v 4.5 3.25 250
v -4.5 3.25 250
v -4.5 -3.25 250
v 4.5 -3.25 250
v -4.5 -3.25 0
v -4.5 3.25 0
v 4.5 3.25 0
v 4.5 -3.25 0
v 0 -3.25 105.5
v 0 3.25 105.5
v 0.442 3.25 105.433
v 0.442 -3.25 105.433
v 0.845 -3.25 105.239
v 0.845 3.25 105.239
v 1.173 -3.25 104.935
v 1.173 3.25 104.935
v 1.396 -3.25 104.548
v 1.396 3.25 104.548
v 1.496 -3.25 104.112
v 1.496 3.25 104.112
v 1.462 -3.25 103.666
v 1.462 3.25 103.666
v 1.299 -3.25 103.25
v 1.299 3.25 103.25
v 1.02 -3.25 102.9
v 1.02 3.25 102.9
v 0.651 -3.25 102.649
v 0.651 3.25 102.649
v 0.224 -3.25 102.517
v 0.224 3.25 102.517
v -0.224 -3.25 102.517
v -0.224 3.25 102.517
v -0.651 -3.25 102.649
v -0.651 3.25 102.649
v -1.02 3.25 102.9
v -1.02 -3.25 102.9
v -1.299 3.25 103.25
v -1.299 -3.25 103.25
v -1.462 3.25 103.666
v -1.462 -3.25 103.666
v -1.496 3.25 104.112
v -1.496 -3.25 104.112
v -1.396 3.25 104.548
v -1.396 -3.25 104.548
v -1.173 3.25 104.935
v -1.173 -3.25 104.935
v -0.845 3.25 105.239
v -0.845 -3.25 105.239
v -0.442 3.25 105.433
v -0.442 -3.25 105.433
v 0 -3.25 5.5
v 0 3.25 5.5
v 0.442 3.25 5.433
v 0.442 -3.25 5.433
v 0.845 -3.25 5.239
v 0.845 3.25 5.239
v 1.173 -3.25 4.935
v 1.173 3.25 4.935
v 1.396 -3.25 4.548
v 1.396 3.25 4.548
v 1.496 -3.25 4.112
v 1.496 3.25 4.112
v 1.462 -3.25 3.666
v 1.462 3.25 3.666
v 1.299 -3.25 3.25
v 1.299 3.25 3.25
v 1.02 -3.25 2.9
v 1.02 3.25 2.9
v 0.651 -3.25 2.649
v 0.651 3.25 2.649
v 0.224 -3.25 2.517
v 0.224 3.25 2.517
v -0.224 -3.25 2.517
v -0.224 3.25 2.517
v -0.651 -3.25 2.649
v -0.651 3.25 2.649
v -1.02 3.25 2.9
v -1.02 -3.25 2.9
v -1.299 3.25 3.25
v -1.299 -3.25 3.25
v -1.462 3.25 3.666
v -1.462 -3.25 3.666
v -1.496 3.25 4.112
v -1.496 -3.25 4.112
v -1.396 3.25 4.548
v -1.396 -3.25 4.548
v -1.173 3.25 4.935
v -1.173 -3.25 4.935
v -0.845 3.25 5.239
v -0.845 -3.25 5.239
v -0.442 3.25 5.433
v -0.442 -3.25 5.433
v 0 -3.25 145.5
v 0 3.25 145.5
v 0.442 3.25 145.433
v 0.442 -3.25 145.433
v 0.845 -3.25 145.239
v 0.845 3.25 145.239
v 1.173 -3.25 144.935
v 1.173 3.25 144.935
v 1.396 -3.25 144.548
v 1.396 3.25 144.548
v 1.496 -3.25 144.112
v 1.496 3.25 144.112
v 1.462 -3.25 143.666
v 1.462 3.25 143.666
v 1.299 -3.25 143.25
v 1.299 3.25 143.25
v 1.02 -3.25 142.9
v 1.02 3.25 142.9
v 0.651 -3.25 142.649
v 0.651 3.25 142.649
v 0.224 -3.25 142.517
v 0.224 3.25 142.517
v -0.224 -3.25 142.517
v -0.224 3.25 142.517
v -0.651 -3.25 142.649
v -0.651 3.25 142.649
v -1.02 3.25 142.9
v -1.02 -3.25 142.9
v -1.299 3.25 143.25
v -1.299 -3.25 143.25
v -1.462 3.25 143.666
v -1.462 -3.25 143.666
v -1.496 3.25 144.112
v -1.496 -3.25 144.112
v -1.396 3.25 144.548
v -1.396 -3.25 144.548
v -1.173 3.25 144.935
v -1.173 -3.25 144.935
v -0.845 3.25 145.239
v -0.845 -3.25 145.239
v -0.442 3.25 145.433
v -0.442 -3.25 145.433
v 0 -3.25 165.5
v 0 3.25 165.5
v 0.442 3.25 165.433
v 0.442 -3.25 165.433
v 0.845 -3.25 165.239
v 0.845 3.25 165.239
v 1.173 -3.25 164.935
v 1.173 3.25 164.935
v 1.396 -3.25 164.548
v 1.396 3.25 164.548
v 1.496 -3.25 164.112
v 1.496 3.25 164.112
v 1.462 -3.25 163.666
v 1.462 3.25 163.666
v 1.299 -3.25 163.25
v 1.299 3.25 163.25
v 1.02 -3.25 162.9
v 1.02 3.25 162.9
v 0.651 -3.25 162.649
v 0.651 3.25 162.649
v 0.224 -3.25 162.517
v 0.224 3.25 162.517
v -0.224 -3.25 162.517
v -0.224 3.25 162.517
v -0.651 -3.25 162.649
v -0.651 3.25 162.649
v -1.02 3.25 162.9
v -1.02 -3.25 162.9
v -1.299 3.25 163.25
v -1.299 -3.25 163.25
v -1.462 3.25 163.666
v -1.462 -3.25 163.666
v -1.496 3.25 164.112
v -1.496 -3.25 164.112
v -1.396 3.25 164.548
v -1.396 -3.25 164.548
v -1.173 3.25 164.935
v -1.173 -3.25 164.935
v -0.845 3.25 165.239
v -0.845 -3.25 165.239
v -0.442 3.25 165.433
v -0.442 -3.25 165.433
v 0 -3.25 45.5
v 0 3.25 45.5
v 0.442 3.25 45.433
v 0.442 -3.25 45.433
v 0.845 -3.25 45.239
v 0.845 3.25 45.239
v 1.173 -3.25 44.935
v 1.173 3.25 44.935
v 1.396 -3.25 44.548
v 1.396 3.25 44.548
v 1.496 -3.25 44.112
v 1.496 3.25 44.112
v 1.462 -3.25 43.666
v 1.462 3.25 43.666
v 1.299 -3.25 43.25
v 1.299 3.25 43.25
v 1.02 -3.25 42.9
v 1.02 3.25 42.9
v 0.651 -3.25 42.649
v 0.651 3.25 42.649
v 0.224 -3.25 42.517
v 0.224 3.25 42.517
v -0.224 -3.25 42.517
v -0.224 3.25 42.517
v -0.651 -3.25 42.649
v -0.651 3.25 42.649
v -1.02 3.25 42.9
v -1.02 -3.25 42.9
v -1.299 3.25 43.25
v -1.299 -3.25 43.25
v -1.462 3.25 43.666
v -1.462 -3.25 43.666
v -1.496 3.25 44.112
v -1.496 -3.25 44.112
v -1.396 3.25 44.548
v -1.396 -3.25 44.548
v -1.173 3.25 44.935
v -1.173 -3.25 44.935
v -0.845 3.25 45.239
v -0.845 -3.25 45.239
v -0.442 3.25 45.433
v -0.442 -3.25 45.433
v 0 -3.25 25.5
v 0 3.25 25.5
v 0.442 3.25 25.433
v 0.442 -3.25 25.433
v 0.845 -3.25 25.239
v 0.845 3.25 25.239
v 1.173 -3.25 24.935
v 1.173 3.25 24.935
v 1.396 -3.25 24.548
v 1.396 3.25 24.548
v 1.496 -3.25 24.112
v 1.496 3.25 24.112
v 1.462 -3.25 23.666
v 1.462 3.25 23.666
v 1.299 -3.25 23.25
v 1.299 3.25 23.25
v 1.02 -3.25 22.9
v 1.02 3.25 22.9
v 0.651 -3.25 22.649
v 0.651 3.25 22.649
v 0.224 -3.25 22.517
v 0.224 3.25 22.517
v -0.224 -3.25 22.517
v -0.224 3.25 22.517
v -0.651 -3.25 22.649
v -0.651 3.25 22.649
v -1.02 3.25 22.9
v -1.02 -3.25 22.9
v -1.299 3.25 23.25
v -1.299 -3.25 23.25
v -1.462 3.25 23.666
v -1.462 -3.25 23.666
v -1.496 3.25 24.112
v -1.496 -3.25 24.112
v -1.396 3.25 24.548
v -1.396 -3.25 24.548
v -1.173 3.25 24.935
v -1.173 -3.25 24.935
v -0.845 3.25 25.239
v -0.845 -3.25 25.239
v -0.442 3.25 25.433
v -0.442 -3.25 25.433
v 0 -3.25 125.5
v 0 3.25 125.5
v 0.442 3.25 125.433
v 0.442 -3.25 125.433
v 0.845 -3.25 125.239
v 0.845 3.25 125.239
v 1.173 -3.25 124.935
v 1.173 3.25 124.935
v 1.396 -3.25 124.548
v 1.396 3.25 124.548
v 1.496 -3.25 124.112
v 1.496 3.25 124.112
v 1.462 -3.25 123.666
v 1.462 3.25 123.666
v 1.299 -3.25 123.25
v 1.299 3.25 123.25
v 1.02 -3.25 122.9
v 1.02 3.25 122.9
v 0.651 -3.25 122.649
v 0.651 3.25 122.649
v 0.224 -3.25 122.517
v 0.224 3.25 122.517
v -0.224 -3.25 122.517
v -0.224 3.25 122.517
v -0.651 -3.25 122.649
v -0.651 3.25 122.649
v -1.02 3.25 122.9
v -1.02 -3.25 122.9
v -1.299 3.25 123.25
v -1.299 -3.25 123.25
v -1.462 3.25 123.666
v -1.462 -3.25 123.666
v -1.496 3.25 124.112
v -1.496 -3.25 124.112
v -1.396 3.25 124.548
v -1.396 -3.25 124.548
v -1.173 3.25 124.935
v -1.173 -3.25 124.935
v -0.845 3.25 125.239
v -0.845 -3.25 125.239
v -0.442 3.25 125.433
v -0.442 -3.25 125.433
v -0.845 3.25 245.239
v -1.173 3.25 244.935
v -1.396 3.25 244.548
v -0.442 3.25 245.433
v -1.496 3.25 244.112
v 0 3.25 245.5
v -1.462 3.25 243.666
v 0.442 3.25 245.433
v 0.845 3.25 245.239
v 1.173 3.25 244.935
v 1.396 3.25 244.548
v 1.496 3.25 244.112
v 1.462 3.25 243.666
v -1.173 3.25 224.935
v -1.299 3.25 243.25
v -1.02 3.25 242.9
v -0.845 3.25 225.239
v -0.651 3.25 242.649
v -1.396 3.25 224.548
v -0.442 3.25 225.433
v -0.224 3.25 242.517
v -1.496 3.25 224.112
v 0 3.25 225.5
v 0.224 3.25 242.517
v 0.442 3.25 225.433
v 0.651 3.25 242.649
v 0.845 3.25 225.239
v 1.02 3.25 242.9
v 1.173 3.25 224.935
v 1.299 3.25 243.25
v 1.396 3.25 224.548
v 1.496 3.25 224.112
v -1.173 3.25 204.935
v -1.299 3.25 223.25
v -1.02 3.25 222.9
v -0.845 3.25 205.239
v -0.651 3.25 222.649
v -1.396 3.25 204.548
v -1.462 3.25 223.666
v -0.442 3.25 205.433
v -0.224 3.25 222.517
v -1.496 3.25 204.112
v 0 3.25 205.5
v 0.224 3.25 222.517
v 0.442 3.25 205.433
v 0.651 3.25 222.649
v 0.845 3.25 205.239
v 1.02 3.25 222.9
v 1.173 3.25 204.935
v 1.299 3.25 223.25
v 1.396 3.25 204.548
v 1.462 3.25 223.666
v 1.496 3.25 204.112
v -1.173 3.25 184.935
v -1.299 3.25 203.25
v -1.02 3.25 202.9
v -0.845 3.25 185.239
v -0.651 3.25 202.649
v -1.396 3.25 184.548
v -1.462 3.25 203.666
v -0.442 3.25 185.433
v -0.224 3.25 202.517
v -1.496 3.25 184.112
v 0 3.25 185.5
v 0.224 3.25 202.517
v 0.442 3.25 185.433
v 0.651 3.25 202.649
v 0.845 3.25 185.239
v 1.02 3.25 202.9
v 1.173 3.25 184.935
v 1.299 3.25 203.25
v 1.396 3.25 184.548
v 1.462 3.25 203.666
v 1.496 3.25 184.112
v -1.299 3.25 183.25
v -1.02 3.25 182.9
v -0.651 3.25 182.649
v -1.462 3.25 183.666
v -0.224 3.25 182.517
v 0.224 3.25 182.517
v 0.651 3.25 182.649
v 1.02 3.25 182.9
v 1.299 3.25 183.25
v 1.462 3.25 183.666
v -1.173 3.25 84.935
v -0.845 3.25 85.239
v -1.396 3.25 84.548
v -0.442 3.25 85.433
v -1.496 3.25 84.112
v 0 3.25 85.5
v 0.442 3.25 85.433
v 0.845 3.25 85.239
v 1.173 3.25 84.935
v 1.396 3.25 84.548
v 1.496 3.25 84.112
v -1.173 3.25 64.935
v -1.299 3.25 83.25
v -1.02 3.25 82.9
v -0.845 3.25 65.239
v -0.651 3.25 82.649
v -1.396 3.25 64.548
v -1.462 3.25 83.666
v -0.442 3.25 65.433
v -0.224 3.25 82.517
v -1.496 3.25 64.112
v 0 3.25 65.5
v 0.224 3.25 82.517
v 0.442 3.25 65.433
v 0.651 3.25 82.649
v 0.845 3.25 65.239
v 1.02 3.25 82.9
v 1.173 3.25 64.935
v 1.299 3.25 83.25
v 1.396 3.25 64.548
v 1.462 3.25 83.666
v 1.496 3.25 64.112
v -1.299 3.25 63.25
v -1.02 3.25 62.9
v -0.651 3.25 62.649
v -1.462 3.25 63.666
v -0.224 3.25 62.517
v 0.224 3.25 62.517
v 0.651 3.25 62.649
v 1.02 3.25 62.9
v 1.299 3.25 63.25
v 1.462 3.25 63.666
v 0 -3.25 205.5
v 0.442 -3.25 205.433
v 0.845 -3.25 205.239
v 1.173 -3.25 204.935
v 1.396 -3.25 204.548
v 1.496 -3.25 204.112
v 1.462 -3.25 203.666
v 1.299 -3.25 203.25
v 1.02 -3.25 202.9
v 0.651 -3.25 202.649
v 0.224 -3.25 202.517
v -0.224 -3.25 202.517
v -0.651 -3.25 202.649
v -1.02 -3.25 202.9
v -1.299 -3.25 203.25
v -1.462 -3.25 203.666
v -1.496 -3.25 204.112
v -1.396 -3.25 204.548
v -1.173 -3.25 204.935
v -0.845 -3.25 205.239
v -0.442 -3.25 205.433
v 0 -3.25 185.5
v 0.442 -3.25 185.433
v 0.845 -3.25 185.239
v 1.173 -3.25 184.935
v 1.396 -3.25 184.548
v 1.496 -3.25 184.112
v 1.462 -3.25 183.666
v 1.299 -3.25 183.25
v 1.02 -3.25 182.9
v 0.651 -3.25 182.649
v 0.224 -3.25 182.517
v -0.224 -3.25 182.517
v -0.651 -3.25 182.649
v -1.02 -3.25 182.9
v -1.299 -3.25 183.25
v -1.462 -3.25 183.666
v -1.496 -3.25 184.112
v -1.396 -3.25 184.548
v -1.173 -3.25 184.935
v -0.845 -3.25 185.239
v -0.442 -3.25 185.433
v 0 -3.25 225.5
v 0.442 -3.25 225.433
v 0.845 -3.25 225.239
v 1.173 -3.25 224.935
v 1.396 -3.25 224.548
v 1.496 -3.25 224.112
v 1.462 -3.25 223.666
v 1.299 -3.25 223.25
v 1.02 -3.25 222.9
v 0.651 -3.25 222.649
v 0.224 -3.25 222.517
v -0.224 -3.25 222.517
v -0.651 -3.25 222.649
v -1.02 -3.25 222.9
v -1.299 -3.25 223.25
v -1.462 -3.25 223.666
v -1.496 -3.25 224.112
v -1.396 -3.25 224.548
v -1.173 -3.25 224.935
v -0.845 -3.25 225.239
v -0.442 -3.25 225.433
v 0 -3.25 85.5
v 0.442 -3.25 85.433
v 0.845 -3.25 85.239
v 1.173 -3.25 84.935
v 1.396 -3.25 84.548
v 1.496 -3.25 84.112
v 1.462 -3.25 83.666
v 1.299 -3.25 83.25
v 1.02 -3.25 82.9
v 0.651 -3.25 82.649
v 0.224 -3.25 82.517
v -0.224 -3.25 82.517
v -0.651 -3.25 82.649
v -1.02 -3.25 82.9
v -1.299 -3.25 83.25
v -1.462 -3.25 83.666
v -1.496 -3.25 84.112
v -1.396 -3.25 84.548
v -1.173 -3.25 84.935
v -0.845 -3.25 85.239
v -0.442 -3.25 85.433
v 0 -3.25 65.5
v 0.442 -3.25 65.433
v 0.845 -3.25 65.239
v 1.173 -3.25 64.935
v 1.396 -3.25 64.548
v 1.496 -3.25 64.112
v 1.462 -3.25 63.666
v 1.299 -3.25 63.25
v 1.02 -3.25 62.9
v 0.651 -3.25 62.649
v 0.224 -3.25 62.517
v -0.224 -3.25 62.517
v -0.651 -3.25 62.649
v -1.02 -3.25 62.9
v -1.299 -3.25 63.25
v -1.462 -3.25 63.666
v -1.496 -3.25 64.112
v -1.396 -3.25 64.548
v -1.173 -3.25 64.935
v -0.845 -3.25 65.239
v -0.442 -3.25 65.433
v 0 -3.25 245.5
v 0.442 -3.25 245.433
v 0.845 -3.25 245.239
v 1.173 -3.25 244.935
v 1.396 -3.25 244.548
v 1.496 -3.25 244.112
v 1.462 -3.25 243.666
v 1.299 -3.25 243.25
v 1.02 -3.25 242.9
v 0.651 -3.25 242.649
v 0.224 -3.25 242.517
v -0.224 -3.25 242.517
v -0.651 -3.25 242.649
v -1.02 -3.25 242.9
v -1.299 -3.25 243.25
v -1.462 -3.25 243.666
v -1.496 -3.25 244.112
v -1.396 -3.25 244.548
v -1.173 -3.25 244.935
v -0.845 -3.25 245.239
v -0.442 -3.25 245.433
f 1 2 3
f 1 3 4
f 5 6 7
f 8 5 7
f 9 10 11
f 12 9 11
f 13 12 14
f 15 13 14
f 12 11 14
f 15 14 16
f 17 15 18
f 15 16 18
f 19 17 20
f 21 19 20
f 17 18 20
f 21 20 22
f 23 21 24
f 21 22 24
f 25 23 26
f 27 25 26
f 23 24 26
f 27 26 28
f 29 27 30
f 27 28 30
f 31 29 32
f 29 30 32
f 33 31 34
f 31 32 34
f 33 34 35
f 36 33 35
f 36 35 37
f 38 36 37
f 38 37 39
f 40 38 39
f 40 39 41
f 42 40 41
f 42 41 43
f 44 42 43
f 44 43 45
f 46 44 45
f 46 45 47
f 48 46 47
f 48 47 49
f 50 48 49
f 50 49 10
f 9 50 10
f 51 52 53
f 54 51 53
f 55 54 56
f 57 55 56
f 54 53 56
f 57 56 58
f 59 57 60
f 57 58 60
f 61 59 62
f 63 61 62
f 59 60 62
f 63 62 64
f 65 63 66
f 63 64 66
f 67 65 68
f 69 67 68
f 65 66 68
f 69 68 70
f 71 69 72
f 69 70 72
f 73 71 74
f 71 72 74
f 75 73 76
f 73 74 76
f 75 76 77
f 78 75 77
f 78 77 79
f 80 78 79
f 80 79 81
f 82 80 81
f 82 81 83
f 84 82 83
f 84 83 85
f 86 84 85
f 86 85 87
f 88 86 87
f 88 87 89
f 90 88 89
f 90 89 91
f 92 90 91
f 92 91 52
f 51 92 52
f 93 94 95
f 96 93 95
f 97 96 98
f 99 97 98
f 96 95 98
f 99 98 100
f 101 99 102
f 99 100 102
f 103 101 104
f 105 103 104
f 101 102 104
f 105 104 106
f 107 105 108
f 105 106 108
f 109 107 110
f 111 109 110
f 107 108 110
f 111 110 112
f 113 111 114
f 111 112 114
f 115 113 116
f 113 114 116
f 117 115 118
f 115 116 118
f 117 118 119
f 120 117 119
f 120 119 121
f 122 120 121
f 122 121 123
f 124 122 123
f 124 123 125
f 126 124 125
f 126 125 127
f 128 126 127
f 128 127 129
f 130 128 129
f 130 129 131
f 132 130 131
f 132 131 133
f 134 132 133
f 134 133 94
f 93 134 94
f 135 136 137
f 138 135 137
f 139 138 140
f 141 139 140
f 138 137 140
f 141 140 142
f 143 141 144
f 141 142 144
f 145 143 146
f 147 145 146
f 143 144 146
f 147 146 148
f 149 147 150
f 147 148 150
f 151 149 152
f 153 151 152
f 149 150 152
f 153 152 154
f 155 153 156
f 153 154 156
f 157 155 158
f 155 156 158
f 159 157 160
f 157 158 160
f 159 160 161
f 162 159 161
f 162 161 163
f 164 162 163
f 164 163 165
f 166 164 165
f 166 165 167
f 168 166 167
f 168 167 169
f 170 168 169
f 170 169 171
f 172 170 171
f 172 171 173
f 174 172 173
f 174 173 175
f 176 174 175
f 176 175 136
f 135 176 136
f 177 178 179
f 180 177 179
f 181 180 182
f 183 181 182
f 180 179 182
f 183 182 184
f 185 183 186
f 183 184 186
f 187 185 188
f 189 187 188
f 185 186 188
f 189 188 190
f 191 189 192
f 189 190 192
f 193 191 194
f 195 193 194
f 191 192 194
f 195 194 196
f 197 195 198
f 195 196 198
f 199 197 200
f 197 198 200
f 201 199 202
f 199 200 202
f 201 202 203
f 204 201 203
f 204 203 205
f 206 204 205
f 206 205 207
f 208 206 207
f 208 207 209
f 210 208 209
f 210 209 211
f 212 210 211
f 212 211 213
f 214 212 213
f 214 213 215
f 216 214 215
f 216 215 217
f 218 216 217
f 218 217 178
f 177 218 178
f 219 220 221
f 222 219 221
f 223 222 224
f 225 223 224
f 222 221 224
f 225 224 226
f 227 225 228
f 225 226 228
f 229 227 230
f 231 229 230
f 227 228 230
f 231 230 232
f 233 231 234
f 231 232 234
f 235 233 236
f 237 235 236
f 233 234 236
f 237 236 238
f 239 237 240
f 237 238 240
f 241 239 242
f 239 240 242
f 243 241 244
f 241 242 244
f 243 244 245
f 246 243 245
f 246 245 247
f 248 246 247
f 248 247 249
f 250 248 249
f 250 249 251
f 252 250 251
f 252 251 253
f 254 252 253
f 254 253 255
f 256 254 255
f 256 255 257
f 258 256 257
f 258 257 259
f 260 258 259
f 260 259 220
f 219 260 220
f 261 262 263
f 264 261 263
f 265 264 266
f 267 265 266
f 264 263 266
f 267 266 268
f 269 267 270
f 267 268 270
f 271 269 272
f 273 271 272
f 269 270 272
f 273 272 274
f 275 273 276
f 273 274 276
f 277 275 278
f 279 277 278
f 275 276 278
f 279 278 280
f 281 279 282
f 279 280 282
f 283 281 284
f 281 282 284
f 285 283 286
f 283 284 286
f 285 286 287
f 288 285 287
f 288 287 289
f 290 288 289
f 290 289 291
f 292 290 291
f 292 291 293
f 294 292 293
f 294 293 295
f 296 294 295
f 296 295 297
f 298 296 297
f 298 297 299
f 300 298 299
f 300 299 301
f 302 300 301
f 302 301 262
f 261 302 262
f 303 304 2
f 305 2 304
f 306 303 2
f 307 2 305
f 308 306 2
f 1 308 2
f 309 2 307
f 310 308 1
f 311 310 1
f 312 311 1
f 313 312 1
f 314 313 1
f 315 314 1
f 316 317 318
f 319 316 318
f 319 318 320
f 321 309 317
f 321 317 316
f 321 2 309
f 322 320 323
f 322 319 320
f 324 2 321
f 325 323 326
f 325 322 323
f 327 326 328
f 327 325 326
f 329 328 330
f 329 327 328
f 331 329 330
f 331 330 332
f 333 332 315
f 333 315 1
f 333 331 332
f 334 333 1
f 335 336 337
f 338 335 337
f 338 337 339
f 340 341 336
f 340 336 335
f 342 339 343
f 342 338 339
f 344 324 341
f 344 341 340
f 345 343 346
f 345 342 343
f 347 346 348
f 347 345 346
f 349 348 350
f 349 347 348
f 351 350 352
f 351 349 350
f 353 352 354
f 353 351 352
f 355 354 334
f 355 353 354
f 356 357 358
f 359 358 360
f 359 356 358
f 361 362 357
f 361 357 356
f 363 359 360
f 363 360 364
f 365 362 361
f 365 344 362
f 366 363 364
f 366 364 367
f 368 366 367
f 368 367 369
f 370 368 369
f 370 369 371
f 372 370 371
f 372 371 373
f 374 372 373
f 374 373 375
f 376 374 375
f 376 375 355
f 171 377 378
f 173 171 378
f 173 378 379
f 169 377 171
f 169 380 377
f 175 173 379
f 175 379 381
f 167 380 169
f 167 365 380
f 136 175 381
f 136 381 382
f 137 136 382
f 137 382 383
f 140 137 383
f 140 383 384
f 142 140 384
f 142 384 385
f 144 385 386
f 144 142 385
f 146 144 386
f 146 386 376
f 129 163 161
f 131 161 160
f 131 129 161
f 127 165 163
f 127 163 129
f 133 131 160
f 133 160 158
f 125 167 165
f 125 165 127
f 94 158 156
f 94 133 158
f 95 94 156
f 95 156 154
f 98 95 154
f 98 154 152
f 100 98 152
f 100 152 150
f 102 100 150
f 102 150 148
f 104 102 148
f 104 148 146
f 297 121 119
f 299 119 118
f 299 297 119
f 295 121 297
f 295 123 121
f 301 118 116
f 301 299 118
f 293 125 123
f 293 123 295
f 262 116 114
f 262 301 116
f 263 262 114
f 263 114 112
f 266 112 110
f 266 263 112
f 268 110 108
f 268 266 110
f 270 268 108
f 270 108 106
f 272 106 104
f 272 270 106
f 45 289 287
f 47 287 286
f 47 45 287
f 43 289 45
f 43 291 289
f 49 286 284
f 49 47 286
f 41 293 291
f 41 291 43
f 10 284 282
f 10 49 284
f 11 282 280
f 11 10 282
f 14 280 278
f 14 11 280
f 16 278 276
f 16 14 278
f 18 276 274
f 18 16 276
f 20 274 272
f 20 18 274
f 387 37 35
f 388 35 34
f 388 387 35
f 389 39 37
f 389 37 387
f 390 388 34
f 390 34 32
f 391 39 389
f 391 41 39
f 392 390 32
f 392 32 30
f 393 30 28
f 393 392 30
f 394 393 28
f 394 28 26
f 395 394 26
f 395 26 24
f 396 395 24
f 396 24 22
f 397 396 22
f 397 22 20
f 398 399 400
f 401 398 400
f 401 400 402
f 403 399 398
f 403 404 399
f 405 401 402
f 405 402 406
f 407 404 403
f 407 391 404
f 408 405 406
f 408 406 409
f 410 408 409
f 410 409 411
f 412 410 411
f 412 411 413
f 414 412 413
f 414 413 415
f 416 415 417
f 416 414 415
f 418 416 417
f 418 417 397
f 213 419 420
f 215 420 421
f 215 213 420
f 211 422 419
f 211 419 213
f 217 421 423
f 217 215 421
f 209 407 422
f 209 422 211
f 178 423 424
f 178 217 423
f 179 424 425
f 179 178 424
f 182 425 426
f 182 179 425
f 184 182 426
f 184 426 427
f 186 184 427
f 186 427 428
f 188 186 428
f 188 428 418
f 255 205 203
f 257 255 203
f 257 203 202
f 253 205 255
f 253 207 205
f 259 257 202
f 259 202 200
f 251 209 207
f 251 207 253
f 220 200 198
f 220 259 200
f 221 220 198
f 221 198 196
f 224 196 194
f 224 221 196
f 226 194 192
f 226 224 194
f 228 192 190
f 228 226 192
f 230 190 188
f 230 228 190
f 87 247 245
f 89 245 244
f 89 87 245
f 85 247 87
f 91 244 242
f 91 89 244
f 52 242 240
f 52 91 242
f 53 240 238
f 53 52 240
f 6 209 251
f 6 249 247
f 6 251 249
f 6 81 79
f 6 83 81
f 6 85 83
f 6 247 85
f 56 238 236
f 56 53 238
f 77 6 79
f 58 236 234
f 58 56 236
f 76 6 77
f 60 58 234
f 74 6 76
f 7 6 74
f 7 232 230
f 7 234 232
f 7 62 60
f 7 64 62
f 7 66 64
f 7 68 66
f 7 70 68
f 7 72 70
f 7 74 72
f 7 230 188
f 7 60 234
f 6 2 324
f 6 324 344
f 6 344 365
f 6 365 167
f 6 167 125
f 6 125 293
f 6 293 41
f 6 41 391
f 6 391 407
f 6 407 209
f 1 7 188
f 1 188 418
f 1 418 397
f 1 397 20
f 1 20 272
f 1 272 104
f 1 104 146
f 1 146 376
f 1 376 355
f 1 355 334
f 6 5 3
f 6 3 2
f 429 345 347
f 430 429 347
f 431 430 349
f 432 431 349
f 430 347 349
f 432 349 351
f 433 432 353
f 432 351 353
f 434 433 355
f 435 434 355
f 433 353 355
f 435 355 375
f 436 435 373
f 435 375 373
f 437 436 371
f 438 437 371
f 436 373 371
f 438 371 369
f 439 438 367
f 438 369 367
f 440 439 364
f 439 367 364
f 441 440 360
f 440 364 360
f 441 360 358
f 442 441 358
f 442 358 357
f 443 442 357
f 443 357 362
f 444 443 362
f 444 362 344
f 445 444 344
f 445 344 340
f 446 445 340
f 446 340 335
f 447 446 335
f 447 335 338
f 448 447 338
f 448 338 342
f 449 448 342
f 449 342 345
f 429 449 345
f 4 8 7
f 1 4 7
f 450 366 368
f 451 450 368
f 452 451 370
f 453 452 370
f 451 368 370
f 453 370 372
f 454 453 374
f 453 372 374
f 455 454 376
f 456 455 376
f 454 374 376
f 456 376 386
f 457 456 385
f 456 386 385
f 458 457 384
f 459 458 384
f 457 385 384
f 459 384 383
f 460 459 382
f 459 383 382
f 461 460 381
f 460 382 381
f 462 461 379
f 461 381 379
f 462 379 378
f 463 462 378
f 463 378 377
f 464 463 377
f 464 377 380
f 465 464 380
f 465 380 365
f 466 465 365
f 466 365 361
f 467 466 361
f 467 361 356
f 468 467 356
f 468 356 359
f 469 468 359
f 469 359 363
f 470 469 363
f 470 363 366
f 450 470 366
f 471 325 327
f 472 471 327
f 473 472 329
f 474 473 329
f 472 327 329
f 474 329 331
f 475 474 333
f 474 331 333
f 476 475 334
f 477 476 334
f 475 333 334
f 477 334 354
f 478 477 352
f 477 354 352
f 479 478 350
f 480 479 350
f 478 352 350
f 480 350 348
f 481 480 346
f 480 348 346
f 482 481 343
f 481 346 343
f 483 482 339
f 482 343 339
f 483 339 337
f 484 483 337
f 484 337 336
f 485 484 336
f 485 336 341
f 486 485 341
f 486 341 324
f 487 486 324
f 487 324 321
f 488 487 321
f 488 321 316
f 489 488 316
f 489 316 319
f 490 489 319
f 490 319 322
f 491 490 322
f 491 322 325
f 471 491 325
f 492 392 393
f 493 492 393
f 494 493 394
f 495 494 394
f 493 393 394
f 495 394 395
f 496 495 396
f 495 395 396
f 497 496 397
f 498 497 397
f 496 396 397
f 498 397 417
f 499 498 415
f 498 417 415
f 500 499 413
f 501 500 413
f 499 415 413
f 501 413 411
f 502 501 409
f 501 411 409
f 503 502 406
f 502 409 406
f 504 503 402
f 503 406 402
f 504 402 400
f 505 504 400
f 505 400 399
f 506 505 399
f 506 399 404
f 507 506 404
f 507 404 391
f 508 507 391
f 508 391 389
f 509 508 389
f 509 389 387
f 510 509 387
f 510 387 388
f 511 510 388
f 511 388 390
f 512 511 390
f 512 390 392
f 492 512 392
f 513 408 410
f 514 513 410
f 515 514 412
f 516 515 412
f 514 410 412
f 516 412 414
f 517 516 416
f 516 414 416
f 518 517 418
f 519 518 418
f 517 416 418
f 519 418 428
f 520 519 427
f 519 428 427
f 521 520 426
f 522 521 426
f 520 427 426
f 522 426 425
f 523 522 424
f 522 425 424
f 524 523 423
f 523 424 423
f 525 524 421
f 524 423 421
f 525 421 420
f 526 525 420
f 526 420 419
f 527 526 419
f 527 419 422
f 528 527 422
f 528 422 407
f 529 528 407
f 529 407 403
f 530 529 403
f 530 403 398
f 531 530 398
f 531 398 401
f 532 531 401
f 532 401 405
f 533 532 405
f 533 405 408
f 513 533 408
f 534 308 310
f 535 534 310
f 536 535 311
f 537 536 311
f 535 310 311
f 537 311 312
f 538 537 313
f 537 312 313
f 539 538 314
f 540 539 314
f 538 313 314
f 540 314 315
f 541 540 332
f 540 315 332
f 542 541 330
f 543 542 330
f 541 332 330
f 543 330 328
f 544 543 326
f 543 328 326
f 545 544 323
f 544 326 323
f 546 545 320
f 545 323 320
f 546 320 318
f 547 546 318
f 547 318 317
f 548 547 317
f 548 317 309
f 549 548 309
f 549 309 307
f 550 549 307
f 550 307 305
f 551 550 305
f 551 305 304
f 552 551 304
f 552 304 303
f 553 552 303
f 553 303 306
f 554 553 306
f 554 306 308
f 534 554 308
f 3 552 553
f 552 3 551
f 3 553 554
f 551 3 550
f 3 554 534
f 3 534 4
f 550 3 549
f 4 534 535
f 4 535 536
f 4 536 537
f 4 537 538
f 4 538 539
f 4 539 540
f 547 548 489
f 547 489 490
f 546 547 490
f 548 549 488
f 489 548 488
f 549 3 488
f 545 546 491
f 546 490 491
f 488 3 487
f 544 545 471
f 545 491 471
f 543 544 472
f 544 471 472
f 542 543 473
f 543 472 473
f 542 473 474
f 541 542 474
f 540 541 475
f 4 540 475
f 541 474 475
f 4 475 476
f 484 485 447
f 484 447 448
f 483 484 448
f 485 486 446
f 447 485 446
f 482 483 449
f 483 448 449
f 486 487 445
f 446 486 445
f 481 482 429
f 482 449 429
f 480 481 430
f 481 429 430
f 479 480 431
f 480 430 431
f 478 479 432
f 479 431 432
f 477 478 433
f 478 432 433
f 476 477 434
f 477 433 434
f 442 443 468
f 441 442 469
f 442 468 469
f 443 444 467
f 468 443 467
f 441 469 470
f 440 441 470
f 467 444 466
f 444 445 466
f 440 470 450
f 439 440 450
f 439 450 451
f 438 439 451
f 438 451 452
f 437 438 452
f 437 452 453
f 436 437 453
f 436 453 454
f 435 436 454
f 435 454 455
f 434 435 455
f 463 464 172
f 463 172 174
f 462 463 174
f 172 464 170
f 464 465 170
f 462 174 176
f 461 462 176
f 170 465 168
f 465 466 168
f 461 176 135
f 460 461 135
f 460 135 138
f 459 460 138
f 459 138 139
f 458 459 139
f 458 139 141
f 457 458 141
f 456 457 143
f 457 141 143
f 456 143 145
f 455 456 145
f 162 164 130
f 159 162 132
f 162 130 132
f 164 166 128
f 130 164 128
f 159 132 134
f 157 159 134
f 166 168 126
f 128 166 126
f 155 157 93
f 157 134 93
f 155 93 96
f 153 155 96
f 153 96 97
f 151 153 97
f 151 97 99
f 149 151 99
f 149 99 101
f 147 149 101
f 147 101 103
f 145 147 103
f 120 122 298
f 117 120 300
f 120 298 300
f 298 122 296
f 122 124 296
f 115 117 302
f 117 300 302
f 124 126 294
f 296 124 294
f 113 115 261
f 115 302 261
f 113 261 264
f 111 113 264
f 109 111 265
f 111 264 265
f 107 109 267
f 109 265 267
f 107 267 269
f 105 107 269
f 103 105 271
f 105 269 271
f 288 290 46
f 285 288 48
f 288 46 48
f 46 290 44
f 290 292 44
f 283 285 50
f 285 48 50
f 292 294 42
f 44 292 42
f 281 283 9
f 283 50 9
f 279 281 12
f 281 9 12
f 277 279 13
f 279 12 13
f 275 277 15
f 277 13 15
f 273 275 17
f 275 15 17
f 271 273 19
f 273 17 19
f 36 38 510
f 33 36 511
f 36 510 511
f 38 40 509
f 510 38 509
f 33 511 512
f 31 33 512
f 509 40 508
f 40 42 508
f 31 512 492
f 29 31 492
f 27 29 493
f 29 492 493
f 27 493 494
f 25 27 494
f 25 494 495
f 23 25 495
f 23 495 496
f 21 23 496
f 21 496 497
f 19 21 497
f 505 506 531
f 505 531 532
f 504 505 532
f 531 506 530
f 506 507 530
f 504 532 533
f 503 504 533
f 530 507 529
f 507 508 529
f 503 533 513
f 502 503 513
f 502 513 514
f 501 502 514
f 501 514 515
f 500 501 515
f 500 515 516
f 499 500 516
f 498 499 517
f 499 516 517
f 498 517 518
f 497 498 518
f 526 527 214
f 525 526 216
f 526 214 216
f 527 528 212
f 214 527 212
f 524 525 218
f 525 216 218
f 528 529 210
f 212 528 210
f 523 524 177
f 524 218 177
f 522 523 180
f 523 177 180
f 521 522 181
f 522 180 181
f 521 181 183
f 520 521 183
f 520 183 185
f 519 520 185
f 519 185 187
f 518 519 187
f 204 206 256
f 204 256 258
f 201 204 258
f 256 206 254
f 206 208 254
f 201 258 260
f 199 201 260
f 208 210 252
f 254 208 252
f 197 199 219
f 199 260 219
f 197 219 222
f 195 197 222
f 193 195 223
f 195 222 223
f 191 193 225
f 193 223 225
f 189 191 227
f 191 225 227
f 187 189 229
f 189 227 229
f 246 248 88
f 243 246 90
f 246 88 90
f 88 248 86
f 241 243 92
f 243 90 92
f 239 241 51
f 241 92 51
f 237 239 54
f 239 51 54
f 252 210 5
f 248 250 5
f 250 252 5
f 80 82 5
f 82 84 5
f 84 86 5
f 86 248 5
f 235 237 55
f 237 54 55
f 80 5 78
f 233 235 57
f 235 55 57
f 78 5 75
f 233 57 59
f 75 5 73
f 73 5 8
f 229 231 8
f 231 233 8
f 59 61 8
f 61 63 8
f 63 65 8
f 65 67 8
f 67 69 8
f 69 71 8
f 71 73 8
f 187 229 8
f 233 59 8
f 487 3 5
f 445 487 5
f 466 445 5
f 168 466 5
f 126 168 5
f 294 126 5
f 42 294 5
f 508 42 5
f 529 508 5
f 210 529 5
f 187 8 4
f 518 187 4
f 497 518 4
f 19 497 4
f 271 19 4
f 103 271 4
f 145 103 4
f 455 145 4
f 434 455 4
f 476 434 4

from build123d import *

# Parameters (mm, degrees)
SKETCH_1_W          = 9
SKETCH_1_H          = 6.5
EXTRUDE_1_DEPTH     = 250
SKETCH_2_R          = 1.5
CUT_EXTRUDE_1_DEPTH = 250


with BuildPart() as part:
    # 草图1 → 凸台-拉伸1 (new body)
    with BuildSketch(Plane.XY):
        Rectangle(SKETCH_1_W, SKETCH_1_H)
    extrude(amount=EXTRUDE_1_DEPTH)

    # 草图2 → 切除-拉伸1 (cut)
    with BuildSketch(Plane(origin=(0, 3.25, 0), x_dir=(1, 0, 0), z_dir=(0, 1, 0))):
        with Locations(Location((0, -4, 0), (0, 0, 270))):
            Circle(SKETCH_2_R)
        with Locations(Location((0, -24, 0), (0, 0, 270))):
            Circle(SKETCH_2_R)
        with Locations(Location((0, -44, 0), (0, 0, 270))):
            Circle(SKETCH_2_R)
        with Locations(Location((0, -64, 0), (0, 0, 270))):
            Circle(SKETCH_2_R)
        with Locations(Location((0, -84, 0), (0, 0, 270))):
            Circle(SKETCH_2_R)
        with Locations(Location((0, -104, 0), (0, 0, 270))):
            Circle(SKETCH_2_R)
        with Locations(Location((0, -124, 0), (0, 0, 270))):
            Circle(SKETCH_2_R)
        with Locations(Location((0, -144, 0), (0, 0, 270))):
            Circle(SKETCH_2_R)
        with Locations(Location((0, -164, 0), (0, 0, 270))):
            Circle(SKETCH_2_R)
        with Locations(Location((0, -184, 0), (0, 0, 270))):
            Circle(SKETCH_2_R)
        with Locations(Location((0, -204, 0), (0, 0, 270))):
            Circle(SKETCH_2_R)
        with Locations(Location((0, -224, 0), (0, 0, 270))):
            Circle(SKETCH_2_R)
        with Locations(Location((0, -244, 0), (0, 0, 270))):
            Circle(SKETCH_2_R)
    extrude(amount=-CUT_EXTRUDE_1_DEPTH, mode=Mode.SUBTRACT)


solid = part.part
